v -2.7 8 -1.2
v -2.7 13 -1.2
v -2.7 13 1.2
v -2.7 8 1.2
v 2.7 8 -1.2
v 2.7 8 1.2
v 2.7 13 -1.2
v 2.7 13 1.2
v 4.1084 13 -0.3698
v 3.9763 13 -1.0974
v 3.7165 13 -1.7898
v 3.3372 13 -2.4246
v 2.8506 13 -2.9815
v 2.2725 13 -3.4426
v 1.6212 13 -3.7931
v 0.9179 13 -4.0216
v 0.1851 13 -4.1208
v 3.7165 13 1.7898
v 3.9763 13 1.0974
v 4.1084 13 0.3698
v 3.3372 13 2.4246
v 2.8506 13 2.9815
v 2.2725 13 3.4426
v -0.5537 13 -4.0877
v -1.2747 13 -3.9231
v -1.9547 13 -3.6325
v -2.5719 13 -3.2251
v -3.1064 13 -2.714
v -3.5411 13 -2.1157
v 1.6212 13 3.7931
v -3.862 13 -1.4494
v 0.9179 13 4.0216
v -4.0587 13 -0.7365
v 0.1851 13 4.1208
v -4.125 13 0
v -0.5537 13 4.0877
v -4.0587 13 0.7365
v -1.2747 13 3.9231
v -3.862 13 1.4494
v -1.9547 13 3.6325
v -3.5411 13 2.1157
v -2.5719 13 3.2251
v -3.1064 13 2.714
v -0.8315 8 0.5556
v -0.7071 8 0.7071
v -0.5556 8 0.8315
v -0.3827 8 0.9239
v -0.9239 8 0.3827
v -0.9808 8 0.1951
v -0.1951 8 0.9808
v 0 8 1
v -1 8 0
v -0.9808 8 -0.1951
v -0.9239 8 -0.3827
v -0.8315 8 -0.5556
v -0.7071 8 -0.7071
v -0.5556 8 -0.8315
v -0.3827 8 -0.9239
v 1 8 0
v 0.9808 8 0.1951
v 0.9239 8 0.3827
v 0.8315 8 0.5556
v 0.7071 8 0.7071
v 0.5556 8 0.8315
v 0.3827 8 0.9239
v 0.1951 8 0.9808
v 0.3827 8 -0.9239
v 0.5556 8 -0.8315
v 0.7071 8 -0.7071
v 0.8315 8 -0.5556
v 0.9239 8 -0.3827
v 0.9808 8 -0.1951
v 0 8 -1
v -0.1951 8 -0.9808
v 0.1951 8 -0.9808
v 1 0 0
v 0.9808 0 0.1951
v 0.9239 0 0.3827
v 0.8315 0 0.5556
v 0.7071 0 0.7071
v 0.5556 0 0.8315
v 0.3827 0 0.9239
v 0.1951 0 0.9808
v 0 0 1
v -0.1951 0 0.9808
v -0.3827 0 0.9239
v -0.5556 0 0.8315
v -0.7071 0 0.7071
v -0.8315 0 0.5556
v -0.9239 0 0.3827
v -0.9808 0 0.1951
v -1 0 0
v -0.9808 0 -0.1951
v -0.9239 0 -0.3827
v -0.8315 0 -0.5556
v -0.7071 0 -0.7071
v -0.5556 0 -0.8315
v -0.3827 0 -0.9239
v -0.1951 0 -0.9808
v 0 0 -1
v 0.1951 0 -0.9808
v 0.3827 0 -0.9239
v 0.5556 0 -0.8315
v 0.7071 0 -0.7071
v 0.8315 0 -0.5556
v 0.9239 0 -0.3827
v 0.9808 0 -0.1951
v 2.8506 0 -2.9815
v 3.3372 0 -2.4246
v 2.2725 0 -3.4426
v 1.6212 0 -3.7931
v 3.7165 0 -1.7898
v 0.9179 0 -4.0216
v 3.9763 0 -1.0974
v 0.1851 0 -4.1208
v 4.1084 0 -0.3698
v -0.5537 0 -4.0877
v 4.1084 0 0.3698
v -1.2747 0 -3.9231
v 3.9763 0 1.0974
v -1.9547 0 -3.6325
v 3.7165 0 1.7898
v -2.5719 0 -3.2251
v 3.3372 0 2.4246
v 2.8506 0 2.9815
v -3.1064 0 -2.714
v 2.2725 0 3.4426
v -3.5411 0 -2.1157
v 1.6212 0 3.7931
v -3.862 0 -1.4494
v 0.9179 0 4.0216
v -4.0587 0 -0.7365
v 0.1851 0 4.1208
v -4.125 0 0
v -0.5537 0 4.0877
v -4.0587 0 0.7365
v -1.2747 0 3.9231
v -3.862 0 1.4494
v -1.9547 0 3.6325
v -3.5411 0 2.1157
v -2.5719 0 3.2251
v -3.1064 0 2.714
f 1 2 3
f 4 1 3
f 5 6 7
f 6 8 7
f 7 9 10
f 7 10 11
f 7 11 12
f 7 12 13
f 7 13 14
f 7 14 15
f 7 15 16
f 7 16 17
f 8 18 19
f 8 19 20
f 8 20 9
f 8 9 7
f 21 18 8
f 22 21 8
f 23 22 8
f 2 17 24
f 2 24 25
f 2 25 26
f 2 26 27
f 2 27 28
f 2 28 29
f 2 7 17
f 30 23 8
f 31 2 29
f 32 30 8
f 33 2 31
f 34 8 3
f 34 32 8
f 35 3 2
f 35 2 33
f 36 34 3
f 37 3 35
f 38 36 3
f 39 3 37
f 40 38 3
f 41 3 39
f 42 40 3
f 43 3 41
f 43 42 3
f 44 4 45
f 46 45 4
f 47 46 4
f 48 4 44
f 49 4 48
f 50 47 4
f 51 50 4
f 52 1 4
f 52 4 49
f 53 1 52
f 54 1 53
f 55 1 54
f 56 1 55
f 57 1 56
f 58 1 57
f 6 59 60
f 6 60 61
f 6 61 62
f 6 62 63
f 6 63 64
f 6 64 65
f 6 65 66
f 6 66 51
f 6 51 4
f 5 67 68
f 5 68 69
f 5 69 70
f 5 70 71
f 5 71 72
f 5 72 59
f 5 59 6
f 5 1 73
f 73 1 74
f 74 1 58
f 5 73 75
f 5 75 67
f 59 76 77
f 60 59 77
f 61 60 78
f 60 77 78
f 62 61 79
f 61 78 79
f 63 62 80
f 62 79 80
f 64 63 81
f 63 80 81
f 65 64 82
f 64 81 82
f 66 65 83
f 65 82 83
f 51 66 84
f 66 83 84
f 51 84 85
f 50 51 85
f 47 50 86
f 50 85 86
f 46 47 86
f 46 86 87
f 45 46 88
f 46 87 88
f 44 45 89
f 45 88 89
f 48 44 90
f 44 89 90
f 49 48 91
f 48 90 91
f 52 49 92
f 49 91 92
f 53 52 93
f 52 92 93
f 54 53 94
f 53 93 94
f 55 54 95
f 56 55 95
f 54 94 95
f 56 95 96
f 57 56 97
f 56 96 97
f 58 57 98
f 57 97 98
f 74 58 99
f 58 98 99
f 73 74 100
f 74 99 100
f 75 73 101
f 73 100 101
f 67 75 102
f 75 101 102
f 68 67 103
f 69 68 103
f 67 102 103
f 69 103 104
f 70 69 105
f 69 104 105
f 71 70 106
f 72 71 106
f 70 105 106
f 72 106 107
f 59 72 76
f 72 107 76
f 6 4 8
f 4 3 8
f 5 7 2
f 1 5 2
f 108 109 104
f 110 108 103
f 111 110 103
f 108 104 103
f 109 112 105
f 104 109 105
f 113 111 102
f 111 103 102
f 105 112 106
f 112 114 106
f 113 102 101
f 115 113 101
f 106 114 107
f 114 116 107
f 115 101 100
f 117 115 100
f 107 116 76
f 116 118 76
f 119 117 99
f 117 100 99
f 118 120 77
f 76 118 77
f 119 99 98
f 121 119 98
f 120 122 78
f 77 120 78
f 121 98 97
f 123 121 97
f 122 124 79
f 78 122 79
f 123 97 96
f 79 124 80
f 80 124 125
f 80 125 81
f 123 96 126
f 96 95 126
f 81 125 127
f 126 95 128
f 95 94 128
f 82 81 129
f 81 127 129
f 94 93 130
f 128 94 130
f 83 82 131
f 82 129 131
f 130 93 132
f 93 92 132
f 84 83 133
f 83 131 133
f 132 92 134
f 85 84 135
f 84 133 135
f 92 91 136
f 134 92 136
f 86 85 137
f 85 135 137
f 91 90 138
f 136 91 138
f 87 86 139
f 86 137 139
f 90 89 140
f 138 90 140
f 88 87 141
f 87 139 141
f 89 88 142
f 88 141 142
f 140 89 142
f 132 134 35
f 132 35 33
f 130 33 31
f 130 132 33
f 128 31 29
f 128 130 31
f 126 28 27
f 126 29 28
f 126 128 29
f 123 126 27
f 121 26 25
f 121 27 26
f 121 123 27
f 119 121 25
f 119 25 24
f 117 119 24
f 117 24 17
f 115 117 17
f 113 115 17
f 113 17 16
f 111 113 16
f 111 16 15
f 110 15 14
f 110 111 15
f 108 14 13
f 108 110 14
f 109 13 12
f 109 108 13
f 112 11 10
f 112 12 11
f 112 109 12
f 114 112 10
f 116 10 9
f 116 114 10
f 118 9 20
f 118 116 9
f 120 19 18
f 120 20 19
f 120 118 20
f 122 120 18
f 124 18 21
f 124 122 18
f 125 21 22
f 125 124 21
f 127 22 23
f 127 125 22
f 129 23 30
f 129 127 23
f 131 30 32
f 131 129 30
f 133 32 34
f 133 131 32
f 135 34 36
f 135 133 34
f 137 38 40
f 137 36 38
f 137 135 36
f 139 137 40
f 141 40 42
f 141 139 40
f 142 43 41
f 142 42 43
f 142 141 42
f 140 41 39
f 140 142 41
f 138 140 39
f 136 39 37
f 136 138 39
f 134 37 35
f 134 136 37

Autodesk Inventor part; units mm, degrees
ref_plane "YZ Plane" through (0, 0, 0) normal (1, 0, 0) x (0, 1, 0)
ref_plane "XZ Plane" through (0, 0, 0) normal (0, 1, 0) x (-1, 0, 0)
ref_plane "XY Plane" through (0, 0, 0) normal (0, 0, 1) x (1, 0, 0)
sketch "Sketch1" plane through (0, 0, 0) normal (0, 1, 0) x (-1, 0, 0)
  circle A0 centre (0, 0) radius 4.125
  dimension "d0" = 8.25
extrude "Extrusion1" add sketch "Sketch1" along normal blind 13
sketch "Sketch2" plane through (0, 0, 0) normal (0, -1, 0) x (1, 0, 0)
  circle A0 centre (0, 0) radius 1
  dimension "d3" = 2
extrude "Extrusion2" cut sketch "Sketch2" against normal blind 8
sketch "Sketch3" plane through (0, 13, 0) normal (0, 1, 0) x (1, 0, 0)
  line L0 (-2.7, -1.2) -> (2.7, -1.2)
  line L1 (2.7, -1.2) -> (2.7, 1.2)
  line L2 (2.7, 1.2) -> (-2.7, 1.2)
  line L3 (-2.7, 1.2) -> (-2.7, -1.2)
  line L4 (-2.7, -1.2) -> (2.7, 1.2) construction
  line L5 (2.7, -1.2) -> (-2.7, 1.2) construction
  point P0 (0, 0)
  dimension "d6" = 2.4
  dimension "d7" = 5.4
extrude "Extrusion3" cut sketch "Sketch3" against normal blind 5
properties part number "encoder_magnet_holder_3DPrint"
